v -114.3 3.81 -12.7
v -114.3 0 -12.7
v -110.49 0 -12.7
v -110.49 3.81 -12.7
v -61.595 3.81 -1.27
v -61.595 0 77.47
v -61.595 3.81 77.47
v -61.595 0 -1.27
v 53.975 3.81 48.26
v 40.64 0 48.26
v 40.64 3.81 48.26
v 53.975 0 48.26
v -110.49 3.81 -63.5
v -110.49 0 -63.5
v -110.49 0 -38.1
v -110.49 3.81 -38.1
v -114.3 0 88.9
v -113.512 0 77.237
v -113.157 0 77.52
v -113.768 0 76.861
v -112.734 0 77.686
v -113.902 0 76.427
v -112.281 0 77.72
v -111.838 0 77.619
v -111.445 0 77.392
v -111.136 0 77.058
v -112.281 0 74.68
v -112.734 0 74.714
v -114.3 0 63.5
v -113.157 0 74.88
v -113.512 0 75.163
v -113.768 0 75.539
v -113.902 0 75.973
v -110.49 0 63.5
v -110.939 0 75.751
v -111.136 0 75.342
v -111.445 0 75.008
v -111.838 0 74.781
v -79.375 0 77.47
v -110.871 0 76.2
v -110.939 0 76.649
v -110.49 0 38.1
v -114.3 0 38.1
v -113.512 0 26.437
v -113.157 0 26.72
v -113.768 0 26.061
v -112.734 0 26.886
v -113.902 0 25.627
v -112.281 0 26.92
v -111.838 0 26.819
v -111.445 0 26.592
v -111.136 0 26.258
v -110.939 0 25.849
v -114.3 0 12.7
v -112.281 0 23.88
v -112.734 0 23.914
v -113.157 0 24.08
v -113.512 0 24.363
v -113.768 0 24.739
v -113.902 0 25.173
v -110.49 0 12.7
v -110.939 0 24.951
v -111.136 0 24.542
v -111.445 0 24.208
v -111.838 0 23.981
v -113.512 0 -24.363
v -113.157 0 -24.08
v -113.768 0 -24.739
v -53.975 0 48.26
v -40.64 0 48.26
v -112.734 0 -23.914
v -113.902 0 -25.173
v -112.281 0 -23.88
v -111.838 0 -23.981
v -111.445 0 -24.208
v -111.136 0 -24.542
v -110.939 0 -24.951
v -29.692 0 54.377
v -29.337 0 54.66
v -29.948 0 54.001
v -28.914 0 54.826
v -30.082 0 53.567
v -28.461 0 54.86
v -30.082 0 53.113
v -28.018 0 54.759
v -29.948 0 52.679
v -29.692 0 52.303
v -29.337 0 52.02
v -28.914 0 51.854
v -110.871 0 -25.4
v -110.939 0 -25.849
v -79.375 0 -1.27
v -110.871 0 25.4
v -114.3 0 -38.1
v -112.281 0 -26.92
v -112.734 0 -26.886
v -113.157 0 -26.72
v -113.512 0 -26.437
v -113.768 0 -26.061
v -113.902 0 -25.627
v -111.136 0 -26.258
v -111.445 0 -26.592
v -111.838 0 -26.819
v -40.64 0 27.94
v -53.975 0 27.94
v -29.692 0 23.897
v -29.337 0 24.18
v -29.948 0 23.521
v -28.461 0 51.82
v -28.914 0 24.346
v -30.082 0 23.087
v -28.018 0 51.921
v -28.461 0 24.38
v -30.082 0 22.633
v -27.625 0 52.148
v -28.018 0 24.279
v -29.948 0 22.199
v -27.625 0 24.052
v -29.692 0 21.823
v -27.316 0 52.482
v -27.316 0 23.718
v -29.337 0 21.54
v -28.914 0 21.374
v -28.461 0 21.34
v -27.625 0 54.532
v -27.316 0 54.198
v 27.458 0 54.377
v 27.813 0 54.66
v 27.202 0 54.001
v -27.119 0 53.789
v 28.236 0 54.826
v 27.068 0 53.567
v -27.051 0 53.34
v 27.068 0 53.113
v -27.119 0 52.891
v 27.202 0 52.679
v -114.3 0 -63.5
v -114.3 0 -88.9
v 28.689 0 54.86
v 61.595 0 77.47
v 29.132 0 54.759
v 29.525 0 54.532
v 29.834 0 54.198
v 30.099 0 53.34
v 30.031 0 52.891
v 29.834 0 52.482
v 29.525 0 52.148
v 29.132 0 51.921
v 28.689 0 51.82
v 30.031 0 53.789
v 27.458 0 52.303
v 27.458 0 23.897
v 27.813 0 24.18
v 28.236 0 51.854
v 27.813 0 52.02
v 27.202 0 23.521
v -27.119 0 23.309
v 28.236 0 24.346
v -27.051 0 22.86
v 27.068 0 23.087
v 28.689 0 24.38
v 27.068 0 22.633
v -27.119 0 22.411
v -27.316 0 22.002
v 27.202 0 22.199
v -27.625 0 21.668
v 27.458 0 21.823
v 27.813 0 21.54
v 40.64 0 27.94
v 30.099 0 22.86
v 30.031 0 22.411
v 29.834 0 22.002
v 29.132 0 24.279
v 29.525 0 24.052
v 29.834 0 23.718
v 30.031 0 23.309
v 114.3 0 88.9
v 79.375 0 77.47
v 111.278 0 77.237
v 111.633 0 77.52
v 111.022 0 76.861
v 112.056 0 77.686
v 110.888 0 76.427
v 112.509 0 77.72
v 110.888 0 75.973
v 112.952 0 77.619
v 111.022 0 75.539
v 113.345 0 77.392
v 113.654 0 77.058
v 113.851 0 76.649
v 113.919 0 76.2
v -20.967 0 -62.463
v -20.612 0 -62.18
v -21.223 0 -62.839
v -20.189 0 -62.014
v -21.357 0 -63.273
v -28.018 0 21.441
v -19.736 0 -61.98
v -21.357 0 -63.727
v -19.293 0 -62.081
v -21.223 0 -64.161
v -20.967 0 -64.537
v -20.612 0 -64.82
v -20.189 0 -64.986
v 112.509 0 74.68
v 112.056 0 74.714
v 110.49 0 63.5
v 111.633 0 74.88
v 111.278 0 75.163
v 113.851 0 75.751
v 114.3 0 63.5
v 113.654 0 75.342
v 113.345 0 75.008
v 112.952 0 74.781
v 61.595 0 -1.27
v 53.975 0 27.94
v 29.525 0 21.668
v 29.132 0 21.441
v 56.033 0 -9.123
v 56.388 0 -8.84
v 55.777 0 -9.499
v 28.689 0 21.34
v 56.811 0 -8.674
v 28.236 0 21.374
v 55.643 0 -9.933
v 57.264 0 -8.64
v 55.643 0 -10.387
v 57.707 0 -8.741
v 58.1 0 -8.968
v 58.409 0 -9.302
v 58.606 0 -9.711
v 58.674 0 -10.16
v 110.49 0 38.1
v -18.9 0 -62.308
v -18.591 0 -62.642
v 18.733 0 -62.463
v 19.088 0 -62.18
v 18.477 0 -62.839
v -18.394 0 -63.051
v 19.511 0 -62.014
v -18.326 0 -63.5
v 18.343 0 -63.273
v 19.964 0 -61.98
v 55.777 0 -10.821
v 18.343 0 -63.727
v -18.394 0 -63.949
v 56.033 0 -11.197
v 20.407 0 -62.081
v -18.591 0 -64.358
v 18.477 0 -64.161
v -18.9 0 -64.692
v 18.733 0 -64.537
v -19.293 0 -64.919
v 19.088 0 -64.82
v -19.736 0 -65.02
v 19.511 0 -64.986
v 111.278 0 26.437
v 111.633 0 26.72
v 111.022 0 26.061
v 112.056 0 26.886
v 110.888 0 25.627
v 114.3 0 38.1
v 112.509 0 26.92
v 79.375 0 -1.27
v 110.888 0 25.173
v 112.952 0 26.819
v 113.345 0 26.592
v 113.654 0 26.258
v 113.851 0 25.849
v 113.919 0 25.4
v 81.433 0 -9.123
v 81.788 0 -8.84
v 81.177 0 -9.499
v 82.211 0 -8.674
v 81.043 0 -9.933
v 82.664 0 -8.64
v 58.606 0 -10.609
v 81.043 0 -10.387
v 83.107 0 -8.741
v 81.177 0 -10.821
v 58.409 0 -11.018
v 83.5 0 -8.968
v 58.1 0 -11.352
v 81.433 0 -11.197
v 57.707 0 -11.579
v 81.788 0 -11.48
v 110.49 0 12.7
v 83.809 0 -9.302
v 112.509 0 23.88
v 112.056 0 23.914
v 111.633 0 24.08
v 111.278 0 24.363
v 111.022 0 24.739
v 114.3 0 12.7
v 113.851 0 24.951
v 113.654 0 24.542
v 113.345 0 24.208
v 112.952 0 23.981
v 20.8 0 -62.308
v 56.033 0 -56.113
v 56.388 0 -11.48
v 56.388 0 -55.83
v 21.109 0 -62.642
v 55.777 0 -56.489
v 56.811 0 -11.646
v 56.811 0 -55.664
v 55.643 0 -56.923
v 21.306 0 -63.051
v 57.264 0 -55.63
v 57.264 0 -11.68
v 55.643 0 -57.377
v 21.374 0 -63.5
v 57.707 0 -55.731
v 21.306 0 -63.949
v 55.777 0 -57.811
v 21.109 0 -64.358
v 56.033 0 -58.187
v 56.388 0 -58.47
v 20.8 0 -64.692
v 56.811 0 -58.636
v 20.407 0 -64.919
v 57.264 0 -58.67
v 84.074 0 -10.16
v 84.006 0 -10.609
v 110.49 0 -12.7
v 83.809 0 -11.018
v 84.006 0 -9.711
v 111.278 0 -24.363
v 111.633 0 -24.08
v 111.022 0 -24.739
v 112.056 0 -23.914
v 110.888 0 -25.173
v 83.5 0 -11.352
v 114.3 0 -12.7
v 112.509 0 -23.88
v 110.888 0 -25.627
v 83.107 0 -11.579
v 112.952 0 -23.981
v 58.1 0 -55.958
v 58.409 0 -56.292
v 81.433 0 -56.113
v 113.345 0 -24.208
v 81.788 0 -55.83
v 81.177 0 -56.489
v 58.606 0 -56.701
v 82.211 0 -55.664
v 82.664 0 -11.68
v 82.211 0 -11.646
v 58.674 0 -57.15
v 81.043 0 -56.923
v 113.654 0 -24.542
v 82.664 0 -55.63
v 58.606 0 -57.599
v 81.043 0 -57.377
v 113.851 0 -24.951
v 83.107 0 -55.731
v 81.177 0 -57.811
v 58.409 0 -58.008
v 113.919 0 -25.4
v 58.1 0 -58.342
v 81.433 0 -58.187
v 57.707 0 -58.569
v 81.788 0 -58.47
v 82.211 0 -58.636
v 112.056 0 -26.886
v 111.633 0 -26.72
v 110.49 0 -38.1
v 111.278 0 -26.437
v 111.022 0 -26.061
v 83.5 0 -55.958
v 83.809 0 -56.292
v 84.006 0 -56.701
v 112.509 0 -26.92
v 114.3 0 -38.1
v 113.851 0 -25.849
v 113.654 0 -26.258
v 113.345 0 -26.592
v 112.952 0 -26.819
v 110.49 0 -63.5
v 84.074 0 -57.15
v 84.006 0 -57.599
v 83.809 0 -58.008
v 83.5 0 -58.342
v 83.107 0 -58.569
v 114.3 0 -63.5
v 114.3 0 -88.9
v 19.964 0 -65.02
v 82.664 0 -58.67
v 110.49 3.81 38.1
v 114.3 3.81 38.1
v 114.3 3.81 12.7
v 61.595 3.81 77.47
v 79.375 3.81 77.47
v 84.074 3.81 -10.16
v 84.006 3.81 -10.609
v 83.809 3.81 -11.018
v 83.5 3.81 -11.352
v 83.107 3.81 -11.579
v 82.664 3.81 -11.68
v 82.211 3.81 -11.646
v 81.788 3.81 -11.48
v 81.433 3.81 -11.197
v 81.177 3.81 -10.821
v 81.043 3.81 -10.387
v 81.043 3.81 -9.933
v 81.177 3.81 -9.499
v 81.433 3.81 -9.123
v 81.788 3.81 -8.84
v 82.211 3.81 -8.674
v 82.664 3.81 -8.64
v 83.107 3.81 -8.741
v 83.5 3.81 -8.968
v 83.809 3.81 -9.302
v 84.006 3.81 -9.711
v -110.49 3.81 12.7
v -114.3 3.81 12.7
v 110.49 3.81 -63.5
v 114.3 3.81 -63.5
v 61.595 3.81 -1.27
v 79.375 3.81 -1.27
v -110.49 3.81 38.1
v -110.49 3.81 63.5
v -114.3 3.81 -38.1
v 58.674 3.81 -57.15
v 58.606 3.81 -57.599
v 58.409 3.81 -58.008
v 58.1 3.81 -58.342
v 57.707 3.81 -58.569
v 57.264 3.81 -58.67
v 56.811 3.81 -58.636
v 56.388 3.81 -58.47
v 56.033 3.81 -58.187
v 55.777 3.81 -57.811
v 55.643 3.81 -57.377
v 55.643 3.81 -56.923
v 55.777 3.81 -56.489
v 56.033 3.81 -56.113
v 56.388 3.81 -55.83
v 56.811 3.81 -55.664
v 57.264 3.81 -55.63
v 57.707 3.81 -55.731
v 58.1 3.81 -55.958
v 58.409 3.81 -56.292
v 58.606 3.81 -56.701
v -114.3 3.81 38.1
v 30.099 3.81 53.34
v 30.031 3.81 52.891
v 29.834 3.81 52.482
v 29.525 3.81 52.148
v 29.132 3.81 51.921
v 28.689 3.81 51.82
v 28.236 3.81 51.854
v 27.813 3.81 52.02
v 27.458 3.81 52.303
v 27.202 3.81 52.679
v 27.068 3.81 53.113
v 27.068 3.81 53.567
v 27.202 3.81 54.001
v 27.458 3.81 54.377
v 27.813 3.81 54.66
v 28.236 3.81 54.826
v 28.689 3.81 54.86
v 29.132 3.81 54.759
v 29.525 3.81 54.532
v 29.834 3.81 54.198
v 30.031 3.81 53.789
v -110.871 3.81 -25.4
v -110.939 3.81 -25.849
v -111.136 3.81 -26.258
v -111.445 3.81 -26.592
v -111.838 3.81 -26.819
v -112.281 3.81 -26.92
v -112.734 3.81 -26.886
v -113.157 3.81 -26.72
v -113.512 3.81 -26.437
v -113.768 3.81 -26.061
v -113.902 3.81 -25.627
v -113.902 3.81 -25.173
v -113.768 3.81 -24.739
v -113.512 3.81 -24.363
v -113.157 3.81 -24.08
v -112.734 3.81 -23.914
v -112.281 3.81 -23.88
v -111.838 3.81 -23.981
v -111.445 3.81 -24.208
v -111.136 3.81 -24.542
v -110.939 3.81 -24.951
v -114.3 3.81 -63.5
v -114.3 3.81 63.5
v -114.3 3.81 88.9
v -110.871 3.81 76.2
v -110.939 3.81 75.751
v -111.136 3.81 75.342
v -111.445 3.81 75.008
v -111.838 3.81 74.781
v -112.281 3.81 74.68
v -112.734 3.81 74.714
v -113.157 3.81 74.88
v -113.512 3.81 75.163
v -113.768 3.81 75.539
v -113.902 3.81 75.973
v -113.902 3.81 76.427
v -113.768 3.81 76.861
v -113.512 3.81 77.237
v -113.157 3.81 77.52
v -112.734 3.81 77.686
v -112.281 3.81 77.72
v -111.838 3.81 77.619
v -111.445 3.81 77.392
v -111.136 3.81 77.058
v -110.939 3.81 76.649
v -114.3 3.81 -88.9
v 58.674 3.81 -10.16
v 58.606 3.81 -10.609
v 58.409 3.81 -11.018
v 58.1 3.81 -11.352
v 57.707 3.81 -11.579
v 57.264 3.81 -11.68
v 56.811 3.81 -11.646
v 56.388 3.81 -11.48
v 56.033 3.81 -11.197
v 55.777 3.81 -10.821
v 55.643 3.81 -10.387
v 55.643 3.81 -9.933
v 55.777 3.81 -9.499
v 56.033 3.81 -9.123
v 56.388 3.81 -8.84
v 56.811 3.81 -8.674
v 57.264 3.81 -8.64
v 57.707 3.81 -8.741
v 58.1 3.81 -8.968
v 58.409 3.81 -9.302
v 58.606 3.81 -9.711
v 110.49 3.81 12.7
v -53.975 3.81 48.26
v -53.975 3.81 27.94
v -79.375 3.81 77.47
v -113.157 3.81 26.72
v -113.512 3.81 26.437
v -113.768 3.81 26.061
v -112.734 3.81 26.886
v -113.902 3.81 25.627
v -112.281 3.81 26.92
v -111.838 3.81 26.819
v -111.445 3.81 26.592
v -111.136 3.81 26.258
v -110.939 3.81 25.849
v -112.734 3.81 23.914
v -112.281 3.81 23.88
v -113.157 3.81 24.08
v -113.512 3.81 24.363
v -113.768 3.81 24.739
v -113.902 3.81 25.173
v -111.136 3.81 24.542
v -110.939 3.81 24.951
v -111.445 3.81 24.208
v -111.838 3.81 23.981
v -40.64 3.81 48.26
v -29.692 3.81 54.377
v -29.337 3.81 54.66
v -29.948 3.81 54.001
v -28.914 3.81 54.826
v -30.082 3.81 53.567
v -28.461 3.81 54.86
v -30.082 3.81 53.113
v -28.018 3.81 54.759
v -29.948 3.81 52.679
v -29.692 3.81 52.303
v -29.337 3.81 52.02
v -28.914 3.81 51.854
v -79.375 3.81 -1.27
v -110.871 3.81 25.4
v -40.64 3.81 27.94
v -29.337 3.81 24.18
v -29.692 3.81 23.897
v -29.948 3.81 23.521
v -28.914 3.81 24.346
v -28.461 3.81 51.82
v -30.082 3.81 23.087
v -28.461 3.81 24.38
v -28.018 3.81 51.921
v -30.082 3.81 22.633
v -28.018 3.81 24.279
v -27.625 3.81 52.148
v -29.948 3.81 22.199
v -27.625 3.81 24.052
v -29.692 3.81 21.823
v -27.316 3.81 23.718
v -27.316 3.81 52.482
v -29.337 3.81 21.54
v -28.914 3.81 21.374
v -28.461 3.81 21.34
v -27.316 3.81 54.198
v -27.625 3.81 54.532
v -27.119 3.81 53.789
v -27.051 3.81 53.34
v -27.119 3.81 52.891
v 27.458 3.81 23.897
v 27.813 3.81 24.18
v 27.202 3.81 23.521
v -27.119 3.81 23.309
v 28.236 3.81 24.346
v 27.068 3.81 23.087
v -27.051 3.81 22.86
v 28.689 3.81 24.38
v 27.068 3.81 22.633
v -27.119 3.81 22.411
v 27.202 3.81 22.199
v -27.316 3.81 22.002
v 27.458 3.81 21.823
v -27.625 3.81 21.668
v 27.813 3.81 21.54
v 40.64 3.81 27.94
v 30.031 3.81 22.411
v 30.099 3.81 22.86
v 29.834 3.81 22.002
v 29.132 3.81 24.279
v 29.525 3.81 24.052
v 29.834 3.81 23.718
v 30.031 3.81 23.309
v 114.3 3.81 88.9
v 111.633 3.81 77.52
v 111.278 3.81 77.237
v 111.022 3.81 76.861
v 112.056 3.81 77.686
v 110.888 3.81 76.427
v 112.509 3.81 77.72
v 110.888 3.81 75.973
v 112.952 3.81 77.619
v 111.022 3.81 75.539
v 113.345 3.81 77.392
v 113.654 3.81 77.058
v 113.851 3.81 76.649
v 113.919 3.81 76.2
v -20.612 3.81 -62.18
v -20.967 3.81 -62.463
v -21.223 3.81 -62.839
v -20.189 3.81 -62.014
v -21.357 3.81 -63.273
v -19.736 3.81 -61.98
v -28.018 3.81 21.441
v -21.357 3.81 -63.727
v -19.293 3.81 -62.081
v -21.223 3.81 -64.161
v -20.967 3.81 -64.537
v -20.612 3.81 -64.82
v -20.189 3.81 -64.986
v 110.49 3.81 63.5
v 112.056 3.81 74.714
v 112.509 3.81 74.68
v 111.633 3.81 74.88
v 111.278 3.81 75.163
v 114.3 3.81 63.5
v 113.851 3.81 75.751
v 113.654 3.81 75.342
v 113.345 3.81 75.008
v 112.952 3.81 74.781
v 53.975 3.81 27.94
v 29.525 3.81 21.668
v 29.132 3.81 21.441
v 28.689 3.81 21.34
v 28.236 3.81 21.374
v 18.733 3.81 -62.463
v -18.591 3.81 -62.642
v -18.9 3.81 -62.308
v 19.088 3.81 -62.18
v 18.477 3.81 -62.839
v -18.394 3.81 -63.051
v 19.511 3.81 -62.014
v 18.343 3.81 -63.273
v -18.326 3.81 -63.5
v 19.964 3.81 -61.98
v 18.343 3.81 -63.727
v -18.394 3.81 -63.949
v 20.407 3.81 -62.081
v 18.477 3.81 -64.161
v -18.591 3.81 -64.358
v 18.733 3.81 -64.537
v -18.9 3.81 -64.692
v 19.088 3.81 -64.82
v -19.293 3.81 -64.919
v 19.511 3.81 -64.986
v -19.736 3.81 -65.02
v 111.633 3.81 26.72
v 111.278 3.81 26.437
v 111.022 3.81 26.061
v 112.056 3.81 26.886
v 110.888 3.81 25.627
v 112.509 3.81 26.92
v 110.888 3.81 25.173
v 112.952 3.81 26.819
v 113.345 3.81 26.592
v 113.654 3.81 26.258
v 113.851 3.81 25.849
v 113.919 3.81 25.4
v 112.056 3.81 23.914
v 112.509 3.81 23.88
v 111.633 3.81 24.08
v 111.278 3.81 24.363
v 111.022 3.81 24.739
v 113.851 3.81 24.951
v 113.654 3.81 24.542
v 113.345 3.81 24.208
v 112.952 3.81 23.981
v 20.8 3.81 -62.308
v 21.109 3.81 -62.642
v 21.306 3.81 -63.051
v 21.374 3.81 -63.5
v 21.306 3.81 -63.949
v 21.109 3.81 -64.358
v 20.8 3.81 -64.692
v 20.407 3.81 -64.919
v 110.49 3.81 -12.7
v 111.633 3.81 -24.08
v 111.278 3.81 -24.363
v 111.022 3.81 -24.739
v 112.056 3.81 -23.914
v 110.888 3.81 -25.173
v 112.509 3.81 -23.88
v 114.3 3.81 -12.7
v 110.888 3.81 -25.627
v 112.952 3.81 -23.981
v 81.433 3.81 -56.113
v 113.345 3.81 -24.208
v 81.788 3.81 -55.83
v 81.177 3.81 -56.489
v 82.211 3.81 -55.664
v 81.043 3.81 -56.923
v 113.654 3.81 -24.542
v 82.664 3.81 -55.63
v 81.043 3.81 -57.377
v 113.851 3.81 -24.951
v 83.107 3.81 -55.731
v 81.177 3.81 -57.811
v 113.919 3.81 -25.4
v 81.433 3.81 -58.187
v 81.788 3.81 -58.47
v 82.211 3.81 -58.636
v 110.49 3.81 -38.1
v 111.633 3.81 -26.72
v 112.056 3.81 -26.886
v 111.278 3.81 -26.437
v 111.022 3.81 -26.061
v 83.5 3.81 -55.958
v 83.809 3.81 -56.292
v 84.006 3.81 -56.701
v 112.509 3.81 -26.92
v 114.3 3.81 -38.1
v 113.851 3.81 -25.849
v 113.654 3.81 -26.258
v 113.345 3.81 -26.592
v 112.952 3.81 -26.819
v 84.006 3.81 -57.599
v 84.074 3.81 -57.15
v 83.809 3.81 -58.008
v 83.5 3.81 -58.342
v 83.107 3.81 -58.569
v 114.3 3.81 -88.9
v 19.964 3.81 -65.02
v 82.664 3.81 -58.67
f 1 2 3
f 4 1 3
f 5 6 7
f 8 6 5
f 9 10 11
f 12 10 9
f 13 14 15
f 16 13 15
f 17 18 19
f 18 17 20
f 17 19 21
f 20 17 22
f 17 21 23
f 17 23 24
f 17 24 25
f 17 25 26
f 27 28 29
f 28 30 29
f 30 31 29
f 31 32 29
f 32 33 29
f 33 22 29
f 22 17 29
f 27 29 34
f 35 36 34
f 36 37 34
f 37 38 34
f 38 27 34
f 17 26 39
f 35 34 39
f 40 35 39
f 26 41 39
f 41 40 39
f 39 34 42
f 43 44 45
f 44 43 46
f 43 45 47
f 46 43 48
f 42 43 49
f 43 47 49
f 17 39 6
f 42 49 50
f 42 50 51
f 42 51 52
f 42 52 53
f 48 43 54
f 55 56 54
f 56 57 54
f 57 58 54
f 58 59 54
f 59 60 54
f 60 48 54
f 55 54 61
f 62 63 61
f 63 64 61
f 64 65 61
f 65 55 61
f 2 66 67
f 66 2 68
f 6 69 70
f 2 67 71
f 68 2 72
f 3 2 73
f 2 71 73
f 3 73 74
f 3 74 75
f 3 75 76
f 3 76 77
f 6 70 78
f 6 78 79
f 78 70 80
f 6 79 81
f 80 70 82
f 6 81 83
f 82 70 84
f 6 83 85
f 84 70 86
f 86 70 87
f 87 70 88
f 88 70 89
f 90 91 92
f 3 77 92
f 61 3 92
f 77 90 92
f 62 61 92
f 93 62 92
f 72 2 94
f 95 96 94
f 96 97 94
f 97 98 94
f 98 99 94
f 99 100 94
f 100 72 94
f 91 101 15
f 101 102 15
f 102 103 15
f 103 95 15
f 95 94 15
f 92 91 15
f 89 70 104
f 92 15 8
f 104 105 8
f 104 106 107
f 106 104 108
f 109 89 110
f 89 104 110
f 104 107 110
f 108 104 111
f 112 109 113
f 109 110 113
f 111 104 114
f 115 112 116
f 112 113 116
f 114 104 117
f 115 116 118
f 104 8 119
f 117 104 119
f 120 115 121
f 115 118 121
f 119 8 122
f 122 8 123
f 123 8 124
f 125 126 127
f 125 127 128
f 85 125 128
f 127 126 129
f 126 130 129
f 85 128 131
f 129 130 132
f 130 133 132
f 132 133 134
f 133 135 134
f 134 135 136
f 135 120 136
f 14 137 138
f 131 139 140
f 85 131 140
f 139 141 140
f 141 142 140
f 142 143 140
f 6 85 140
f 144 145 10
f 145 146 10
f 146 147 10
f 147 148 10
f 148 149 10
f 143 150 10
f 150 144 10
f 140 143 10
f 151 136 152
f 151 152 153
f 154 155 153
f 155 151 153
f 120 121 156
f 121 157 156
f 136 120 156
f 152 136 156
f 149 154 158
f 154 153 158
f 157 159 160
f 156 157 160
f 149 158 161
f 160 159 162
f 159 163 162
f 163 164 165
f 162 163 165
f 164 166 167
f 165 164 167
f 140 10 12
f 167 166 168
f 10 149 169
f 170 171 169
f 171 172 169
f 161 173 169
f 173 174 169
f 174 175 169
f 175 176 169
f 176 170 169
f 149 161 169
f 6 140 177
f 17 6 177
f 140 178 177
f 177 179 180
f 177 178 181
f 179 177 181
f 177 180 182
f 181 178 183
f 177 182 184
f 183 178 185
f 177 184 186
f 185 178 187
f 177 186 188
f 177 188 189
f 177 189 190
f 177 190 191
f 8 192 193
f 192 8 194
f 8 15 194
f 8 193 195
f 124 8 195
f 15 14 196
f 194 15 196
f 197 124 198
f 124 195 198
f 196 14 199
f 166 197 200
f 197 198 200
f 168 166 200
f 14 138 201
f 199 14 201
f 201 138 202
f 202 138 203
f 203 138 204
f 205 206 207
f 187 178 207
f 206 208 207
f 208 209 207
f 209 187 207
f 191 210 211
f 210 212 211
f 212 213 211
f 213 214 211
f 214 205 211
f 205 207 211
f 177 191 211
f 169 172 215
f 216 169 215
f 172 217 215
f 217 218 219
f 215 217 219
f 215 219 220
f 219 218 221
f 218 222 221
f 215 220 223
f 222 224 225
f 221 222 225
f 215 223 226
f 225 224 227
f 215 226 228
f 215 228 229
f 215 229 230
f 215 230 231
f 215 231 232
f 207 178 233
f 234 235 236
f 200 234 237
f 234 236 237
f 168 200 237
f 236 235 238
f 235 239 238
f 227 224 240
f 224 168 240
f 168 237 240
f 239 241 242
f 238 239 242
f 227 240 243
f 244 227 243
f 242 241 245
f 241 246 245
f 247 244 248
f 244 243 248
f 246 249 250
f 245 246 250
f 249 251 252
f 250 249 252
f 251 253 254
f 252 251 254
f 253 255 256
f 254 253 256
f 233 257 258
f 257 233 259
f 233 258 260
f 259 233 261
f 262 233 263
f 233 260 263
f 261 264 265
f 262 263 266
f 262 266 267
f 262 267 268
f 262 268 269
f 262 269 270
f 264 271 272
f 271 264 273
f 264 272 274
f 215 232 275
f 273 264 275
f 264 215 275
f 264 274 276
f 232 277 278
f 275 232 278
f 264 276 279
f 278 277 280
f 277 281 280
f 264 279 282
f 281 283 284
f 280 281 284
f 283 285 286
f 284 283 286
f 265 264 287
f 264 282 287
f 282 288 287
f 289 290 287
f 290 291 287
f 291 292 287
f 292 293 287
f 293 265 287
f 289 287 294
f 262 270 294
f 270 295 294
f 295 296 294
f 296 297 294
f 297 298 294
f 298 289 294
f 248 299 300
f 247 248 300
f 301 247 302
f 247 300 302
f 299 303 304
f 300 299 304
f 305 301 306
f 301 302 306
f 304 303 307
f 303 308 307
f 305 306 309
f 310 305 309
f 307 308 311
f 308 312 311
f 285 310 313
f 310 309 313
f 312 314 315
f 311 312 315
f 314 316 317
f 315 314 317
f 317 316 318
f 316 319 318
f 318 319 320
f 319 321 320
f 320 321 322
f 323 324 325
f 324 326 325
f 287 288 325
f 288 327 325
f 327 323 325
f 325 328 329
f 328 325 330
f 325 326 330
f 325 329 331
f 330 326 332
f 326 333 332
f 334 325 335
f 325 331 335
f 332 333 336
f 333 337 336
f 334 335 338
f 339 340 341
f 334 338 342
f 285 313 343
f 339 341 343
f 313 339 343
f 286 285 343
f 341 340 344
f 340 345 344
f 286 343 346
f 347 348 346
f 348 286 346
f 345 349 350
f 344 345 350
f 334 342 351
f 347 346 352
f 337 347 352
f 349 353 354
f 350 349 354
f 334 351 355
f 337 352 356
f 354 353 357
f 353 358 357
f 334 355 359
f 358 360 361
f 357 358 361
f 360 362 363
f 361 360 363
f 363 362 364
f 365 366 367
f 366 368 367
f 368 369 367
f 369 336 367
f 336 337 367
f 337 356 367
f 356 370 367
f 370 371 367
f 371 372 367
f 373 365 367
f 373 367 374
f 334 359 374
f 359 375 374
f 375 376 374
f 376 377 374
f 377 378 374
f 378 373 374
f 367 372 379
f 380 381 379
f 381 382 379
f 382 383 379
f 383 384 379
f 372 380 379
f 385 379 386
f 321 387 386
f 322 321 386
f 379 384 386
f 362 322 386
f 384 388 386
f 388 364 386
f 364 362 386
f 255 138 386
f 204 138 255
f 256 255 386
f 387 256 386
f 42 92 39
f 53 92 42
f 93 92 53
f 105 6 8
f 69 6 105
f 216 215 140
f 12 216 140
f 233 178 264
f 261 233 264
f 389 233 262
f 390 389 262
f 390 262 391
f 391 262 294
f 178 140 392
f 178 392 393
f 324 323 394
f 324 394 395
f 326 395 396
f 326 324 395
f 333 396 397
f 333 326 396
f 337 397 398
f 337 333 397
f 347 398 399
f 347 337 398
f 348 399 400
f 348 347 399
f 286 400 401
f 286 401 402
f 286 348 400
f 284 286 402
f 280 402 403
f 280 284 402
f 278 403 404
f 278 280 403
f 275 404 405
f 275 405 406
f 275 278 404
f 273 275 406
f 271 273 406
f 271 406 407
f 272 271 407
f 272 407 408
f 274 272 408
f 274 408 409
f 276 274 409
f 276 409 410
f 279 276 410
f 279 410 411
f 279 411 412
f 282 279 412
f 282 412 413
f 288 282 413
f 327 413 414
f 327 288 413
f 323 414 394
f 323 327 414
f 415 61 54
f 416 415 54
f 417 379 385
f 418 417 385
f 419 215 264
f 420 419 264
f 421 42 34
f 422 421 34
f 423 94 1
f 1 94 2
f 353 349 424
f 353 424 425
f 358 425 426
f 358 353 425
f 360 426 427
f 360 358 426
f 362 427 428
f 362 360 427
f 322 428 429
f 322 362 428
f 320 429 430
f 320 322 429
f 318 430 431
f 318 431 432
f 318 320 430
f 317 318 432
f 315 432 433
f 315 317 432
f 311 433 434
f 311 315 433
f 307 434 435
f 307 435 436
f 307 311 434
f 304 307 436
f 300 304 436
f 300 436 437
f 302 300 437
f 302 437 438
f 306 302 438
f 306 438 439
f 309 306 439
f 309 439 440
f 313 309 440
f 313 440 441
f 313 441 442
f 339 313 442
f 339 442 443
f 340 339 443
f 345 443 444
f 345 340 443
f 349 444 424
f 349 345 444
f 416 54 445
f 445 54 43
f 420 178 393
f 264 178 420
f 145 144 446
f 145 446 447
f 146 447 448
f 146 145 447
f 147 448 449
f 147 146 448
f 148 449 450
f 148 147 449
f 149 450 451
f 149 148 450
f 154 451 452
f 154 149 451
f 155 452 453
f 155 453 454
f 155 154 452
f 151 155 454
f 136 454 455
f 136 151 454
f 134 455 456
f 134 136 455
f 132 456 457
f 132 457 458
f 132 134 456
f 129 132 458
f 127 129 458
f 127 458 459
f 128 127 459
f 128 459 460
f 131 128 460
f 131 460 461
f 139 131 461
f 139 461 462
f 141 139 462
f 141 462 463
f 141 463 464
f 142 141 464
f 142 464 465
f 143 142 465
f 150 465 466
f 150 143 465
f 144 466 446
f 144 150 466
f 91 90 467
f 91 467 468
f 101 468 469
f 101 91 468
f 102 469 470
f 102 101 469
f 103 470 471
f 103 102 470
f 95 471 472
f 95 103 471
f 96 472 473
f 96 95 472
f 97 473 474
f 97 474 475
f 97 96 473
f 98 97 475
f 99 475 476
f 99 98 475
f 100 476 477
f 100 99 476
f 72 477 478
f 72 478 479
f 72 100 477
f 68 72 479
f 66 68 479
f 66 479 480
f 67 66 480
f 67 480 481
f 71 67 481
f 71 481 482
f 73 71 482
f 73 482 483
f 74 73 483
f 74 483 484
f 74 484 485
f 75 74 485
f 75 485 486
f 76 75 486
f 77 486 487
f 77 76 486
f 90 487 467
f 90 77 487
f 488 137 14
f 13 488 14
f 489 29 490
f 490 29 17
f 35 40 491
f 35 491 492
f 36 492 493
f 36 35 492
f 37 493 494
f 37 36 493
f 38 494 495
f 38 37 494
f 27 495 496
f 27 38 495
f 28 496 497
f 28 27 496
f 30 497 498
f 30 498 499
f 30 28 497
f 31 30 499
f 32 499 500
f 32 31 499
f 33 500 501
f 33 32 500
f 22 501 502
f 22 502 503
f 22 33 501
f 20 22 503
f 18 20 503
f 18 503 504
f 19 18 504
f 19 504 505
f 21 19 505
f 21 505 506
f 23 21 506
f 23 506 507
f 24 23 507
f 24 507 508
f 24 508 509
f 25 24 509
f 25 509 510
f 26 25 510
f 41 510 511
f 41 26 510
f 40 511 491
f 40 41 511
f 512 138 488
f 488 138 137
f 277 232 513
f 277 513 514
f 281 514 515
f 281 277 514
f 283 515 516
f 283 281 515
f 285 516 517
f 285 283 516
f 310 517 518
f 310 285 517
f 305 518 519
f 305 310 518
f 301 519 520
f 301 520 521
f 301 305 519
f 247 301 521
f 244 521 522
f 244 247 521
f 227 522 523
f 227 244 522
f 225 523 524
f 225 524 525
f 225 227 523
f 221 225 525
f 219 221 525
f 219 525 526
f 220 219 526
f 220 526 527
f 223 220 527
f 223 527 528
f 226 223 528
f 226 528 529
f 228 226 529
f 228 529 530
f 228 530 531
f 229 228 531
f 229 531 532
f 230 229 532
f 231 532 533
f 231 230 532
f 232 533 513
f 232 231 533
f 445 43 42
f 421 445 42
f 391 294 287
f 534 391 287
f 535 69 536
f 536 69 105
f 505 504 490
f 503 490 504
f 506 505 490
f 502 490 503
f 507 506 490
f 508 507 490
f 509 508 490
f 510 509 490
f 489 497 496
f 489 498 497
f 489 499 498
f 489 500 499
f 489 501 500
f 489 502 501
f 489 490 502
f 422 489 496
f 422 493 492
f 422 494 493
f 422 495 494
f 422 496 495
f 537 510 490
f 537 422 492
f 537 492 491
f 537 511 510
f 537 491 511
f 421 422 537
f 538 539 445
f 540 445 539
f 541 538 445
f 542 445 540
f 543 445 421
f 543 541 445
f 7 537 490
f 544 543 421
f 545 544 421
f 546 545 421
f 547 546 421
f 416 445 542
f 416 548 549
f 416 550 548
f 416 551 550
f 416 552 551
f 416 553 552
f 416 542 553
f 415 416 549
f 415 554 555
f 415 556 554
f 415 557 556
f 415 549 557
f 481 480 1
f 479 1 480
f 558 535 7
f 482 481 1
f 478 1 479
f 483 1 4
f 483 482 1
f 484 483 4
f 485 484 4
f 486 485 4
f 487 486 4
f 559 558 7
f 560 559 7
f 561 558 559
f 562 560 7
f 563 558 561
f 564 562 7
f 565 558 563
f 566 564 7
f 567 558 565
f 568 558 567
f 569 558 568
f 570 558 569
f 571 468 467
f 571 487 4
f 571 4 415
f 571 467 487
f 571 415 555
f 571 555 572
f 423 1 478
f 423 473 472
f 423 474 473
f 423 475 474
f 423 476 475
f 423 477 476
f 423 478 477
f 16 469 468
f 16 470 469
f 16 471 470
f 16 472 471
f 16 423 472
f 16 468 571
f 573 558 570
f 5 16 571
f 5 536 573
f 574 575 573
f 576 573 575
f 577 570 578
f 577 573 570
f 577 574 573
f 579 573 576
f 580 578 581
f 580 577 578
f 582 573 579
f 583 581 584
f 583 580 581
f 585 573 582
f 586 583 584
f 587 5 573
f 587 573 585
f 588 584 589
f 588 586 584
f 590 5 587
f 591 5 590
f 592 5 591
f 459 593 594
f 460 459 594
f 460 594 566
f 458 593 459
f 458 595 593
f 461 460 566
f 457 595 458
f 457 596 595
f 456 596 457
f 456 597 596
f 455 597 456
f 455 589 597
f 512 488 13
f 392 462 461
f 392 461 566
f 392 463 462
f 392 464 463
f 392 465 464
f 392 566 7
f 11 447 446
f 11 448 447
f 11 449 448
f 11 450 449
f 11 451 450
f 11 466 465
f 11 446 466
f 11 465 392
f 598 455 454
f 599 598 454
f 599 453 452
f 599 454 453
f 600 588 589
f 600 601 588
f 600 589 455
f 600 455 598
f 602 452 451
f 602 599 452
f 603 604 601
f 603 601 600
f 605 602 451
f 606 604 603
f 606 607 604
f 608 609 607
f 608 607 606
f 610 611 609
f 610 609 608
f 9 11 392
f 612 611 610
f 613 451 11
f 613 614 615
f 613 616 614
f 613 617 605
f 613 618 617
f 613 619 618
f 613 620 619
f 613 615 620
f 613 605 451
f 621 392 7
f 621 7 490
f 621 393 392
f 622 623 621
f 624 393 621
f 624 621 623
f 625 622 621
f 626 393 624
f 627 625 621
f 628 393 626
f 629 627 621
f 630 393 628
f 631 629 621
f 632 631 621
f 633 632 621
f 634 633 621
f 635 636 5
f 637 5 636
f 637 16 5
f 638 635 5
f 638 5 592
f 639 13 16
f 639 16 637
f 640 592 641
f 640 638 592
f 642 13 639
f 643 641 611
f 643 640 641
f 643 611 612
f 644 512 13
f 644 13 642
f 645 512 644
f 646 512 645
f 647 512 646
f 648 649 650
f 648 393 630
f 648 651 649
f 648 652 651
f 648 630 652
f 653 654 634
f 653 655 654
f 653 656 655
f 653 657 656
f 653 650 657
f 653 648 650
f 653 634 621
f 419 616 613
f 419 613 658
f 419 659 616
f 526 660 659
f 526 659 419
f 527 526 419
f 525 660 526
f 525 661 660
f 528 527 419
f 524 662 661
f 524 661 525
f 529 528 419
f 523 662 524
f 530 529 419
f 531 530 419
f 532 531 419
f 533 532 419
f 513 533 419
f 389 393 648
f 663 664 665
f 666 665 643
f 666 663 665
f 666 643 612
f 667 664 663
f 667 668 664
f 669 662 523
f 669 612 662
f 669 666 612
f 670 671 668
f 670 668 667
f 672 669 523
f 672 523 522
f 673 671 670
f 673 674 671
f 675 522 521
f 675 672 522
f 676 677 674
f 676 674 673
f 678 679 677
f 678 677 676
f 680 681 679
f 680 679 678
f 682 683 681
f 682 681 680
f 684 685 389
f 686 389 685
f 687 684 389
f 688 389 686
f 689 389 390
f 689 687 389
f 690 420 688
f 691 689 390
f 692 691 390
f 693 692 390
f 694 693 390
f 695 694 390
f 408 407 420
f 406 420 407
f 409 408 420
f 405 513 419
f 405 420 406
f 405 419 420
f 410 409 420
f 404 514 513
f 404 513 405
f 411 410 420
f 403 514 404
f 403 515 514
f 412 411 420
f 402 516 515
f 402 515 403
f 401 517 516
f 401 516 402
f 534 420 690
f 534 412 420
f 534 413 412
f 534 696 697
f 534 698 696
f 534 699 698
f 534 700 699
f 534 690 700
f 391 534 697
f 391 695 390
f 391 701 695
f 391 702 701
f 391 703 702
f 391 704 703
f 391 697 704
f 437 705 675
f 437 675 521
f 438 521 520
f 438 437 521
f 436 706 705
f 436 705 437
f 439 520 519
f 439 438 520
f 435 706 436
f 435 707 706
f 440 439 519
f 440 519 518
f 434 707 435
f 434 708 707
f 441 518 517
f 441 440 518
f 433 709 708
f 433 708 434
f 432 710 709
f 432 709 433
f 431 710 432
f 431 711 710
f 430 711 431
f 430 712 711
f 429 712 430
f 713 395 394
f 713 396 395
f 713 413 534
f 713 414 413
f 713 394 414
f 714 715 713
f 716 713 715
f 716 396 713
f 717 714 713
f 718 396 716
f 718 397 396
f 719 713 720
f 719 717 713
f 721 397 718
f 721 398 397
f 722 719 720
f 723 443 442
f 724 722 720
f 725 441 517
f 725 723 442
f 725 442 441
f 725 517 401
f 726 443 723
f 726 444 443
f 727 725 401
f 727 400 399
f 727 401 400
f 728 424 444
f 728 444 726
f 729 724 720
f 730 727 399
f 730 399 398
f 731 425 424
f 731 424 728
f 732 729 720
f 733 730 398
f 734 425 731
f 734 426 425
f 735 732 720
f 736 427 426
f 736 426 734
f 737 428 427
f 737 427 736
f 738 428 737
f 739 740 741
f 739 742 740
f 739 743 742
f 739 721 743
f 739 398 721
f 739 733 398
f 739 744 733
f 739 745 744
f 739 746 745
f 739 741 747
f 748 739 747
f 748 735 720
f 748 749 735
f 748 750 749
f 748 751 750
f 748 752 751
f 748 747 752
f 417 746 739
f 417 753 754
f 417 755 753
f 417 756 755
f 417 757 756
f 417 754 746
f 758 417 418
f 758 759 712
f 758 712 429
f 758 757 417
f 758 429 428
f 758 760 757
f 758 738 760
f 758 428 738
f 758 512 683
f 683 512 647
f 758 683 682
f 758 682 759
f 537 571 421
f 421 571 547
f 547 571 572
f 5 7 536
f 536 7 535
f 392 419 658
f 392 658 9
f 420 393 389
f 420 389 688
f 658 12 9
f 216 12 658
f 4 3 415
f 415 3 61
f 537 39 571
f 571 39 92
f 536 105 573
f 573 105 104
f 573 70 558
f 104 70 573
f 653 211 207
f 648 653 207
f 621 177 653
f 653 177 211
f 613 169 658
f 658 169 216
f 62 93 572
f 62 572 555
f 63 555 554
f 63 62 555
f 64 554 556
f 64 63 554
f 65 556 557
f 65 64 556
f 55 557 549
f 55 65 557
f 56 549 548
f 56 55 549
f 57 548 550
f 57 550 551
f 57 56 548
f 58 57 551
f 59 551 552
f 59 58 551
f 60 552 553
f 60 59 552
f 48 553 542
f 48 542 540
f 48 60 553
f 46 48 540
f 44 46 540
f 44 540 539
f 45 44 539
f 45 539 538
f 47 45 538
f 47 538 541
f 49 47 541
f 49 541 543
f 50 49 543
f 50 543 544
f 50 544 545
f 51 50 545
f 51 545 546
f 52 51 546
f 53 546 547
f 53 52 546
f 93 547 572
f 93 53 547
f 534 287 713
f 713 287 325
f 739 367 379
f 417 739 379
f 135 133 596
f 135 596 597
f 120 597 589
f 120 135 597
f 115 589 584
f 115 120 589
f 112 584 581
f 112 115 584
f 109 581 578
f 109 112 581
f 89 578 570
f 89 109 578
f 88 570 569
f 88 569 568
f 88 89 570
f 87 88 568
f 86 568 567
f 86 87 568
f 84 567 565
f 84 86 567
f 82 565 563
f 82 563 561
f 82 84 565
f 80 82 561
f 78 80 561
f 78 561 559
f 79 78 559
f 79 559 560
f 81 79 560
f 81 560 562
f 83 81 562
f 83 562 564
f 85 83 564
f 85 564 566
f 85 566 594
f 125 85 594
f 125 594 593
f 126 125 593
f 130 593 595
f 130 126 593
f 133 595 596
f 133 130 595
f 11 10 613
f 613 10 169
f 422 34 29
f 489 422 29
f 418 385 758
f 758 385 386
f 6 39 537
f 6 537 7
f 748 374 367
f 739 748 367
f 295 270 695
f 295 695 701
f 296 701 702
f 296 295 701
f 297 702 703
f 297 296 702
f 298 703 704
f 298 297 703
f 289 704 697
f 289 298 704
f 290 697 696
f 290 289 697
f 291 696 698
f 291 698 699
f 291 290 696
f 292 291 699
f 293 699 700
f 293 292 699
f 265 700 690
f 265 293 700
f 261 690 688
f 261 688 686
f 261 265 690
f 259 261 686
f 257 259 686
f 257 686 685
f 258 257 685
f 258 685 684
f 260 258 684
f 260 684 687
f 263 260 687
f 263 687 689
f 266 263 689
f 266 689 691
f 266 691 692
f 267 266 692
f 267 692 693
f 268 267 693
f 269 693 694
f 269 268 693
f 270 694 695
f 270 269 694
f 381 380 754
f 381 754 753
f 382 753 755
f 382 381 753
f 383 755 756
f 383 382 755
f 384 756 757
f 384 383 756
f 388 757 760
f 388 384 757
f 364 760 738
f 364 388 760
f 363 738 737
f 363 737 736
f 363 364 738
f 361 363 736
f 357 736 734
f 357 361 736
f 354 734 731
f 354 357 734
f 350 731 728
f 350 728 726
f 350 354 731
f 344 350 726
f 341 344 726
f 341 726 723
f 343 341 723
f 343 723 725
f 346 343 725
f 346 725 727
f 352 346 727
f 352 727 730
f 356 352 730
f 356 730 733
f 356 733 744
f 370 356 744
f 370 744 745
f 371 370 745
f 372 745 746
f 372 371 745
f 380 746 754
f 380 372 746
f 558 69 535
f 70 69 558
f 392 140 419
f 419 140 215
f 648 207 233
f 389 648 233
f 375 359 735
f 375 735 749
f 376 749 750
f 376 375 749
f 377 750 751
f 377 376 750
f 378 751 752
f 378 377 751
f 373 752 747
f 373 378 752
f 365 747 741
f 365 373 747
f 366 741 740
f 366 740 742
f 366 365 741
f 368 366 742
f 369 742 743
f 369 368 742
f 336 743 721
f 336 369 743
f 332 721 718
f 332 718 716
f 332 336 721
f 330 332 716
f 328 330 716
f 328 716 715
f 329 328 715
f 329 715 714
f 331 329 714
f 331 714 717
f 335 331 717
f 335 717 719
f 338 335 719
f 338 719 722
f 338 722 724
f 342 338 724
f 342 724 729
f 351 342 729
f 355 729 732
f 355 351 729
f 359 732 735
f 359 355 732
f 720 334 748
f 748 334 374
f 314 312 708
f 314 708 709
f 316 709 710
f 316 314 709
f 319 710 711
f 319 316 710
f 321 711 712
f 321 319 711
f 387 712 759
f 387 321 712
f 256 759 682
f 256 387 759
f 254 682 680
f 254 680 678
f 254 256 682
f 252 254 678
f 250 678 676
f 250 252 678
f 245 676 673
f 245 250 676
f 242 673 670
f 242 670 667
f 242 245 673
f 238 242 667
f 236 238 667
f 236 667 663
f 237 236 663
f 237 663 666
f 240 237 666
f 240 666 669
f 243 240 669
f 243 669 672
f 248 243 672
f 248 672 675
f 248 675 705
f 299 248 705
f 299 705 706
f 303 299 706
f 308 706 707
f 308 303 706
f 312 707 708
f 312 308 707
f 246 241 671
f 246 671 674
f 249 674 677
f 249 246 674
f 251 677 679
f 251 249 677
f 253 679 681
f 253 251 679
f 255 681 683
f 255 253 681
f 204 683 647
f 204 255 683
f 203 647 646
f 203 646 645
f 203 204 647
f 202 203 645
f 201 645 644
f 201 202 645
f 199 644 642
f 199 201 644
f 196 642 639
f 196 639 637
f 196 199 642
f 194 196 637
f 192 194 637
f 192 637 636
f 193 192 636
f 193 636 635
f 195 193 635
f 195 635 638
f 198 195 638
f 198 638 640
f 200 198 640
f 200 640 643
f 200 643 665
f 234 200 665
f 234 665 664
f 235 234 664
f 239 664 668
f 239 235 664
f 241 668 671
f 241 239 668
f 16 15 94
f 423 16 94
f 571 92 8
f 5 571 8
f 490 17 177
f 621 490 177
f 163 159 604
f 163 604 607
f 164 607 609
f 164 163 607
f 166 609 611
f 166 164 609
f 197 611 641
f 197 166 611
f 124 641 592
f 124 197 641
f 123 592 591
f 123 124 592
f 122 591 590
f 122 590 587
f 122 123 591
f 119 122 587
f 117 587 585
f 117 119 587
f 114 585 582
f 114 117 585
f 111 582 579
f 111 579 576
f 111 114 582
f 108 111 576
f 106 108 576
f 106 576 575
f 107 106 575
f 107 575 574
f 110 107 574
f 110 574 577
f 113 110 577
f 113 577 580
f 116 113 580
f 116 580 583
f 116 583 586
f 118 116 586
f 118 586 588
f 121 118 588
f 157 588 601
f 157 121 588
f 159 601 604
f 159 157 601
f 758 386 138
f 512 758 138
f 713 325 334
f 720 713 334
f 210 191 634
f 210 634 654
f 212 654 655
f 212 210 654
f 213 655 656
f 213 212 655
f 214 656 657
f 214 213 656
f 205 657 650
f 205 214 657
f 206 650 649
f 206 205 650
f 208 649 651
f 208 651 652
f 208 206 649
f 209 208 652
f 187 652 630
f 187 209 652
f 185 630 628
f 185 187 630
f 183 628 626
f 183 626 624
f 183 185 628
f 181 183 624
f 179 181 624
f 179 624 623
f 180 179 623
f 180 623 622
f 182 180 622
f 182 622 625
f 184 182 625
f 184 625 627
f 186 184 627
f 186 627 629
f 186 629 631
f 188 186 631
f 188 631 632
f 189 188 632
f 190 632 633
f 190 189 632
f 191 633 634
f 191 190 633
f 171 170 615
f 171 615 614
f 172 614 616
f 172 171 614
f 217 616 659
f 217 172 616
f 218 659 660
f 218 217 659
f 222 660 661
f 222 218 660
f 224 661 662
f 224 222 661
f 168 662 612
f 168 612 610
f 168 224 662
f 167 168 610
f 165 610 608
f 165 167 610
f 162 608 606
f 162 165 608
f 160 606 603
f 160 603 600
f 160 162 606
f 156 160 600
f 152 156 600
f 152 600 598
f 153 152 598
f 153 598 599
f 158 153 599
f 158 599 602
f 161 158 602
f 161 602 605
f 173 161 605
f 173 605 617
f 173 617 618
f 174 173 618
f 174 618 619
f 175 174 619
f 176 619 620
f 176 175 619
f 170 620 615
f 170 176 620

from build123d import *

# Parameters (mm, degrees)
SKETCH1_R           = 1.524
SKETCH1_W           = 13.335
SKETCH1_H           = 20.32
SKETCH1_W_2         = 17.78
SKETCH1_H_2         = 78.74
BOSS_EXTRUDE1_DEPTH = 3.81


with BuildPart() as part:
    # Sketch1 → Boss-Extrude1 (new body)
    with BuildSketch(Plane(origin=(0, 0, 0), x_dir=(1, 0, 0), z_dir=(0, 1, 0))):
        Polygon((-114.3, -88.9), (114.3, -88.9), (114.3, -63.5), (110.49, -63.5), (110.49, -38.1), (114.3, -38.1), (114.3, -12.7), (110.49, -12.7), (110.49, 12.7), (114.3, 12.7), (114.3, 38.1), (110.49, 38.1), (110.49, 63.5), (114.3, 63.5), (114.3, 88.9), (-114.3, 88.9), (-114.3, 63.5), (-110.49, 63.5), (-110.49, 38.1), (-114.3, 38.1), (-114.3, 12.7), (-110.49, 12.7), (-110.49, -12.7), (-114.3, -12.7), (-114.3, -38.1), (-110.49, -38.1), (-110.49, -63.5), (-114.3, -63.5), align=None)
        with Locations((-28.575, -22.86)):
            Circle(SKETCH1_R, mode=Mode.SUBTRACT)
        with Locations((-28.575, -53.34)):
            Circle(SKETCH1_R, mode=Mode.SUBTRACT)
        with Locations((28.575, -53.34)):
            Circle(SKETCH1_R, mode=Mode.SUBTRACT)
        with Locations((28.575, -22.86)):
            Circle(SKETCH1_R, mode=Mode.SUBTRACT)
        with Locations((57.15, 57.15)):
            Circle(SKETCH1_R, mode=Mode.SUBTRACT)
        with Locations((57.15, 10.16)):
            Circle(SKETCH1_R, mode=Mode.SUBTRACT)
        with Locations((82.55, 10.16)):
            Circle(SKETCH1_R, mode=Mode.SUBTRACT)
        with Locations((82.55, 57.15)):
            Circle(SKETCH1_R, mode=Mode.SUBTRACT)
        with Locations((112.395, -76.2)):
            Circle(SKETCH1_R, mode=Mode.SUBTRACT)
        with Locations((-112.395, -76.2)):
            Circle(SKETCH1_R, mode=Mode.SUBTRACT)
        with Locations((-112.395, -25.4)):
            Circle(SKETCH1_R, mode=Mode.SUBTRACT)
        with Locations((-112.395, 25.4)):
            Circle(SKETCH1_R, mode=Mode.SUBTRACT)
        with Locations((112.395, -25.4)):
            Circle(SKETCH1_R, mode=Mode.SUBTRACT)
        with Locations((112.395, 25.4)):
            Circle(SKETCH1_R, mode=Mode.SUBTRACT)
        with Locations((-19.8501, 63.5)):
            Circle(SKETCH1_R, mode=Mode.SUBTRACT)
        with Locations((19.8501, 63.5)):
            Circle(SKETCH1_R, mode=Mode.SUBTRACT)
        with Locations((-47.3075, -38.1)):
            Rectangle(SKETCH1_W, SKETCH1_H, mode=Mode.SUBTRACT)
        with Locations((70.485, -38.1)):
            Rectangle(SKETCH1_W_2, SKETCH1_H_2, mode=Mode.SUBTRACT)
        with Locations((-70.485, -38.1)):
            Rectangle(SKETCH1_W_2, SKETCH1_H_2, mode=Mode.SUBTRACT)
        with Locations((47.3075, -38.1)):
            Rectangle(SKETCH1_W, SKETCH1_H, mode=Mode.SUBTRACT)
    extrude(amount=BOSS_EXTRUDE1_DEPTH)


solid = part.part
